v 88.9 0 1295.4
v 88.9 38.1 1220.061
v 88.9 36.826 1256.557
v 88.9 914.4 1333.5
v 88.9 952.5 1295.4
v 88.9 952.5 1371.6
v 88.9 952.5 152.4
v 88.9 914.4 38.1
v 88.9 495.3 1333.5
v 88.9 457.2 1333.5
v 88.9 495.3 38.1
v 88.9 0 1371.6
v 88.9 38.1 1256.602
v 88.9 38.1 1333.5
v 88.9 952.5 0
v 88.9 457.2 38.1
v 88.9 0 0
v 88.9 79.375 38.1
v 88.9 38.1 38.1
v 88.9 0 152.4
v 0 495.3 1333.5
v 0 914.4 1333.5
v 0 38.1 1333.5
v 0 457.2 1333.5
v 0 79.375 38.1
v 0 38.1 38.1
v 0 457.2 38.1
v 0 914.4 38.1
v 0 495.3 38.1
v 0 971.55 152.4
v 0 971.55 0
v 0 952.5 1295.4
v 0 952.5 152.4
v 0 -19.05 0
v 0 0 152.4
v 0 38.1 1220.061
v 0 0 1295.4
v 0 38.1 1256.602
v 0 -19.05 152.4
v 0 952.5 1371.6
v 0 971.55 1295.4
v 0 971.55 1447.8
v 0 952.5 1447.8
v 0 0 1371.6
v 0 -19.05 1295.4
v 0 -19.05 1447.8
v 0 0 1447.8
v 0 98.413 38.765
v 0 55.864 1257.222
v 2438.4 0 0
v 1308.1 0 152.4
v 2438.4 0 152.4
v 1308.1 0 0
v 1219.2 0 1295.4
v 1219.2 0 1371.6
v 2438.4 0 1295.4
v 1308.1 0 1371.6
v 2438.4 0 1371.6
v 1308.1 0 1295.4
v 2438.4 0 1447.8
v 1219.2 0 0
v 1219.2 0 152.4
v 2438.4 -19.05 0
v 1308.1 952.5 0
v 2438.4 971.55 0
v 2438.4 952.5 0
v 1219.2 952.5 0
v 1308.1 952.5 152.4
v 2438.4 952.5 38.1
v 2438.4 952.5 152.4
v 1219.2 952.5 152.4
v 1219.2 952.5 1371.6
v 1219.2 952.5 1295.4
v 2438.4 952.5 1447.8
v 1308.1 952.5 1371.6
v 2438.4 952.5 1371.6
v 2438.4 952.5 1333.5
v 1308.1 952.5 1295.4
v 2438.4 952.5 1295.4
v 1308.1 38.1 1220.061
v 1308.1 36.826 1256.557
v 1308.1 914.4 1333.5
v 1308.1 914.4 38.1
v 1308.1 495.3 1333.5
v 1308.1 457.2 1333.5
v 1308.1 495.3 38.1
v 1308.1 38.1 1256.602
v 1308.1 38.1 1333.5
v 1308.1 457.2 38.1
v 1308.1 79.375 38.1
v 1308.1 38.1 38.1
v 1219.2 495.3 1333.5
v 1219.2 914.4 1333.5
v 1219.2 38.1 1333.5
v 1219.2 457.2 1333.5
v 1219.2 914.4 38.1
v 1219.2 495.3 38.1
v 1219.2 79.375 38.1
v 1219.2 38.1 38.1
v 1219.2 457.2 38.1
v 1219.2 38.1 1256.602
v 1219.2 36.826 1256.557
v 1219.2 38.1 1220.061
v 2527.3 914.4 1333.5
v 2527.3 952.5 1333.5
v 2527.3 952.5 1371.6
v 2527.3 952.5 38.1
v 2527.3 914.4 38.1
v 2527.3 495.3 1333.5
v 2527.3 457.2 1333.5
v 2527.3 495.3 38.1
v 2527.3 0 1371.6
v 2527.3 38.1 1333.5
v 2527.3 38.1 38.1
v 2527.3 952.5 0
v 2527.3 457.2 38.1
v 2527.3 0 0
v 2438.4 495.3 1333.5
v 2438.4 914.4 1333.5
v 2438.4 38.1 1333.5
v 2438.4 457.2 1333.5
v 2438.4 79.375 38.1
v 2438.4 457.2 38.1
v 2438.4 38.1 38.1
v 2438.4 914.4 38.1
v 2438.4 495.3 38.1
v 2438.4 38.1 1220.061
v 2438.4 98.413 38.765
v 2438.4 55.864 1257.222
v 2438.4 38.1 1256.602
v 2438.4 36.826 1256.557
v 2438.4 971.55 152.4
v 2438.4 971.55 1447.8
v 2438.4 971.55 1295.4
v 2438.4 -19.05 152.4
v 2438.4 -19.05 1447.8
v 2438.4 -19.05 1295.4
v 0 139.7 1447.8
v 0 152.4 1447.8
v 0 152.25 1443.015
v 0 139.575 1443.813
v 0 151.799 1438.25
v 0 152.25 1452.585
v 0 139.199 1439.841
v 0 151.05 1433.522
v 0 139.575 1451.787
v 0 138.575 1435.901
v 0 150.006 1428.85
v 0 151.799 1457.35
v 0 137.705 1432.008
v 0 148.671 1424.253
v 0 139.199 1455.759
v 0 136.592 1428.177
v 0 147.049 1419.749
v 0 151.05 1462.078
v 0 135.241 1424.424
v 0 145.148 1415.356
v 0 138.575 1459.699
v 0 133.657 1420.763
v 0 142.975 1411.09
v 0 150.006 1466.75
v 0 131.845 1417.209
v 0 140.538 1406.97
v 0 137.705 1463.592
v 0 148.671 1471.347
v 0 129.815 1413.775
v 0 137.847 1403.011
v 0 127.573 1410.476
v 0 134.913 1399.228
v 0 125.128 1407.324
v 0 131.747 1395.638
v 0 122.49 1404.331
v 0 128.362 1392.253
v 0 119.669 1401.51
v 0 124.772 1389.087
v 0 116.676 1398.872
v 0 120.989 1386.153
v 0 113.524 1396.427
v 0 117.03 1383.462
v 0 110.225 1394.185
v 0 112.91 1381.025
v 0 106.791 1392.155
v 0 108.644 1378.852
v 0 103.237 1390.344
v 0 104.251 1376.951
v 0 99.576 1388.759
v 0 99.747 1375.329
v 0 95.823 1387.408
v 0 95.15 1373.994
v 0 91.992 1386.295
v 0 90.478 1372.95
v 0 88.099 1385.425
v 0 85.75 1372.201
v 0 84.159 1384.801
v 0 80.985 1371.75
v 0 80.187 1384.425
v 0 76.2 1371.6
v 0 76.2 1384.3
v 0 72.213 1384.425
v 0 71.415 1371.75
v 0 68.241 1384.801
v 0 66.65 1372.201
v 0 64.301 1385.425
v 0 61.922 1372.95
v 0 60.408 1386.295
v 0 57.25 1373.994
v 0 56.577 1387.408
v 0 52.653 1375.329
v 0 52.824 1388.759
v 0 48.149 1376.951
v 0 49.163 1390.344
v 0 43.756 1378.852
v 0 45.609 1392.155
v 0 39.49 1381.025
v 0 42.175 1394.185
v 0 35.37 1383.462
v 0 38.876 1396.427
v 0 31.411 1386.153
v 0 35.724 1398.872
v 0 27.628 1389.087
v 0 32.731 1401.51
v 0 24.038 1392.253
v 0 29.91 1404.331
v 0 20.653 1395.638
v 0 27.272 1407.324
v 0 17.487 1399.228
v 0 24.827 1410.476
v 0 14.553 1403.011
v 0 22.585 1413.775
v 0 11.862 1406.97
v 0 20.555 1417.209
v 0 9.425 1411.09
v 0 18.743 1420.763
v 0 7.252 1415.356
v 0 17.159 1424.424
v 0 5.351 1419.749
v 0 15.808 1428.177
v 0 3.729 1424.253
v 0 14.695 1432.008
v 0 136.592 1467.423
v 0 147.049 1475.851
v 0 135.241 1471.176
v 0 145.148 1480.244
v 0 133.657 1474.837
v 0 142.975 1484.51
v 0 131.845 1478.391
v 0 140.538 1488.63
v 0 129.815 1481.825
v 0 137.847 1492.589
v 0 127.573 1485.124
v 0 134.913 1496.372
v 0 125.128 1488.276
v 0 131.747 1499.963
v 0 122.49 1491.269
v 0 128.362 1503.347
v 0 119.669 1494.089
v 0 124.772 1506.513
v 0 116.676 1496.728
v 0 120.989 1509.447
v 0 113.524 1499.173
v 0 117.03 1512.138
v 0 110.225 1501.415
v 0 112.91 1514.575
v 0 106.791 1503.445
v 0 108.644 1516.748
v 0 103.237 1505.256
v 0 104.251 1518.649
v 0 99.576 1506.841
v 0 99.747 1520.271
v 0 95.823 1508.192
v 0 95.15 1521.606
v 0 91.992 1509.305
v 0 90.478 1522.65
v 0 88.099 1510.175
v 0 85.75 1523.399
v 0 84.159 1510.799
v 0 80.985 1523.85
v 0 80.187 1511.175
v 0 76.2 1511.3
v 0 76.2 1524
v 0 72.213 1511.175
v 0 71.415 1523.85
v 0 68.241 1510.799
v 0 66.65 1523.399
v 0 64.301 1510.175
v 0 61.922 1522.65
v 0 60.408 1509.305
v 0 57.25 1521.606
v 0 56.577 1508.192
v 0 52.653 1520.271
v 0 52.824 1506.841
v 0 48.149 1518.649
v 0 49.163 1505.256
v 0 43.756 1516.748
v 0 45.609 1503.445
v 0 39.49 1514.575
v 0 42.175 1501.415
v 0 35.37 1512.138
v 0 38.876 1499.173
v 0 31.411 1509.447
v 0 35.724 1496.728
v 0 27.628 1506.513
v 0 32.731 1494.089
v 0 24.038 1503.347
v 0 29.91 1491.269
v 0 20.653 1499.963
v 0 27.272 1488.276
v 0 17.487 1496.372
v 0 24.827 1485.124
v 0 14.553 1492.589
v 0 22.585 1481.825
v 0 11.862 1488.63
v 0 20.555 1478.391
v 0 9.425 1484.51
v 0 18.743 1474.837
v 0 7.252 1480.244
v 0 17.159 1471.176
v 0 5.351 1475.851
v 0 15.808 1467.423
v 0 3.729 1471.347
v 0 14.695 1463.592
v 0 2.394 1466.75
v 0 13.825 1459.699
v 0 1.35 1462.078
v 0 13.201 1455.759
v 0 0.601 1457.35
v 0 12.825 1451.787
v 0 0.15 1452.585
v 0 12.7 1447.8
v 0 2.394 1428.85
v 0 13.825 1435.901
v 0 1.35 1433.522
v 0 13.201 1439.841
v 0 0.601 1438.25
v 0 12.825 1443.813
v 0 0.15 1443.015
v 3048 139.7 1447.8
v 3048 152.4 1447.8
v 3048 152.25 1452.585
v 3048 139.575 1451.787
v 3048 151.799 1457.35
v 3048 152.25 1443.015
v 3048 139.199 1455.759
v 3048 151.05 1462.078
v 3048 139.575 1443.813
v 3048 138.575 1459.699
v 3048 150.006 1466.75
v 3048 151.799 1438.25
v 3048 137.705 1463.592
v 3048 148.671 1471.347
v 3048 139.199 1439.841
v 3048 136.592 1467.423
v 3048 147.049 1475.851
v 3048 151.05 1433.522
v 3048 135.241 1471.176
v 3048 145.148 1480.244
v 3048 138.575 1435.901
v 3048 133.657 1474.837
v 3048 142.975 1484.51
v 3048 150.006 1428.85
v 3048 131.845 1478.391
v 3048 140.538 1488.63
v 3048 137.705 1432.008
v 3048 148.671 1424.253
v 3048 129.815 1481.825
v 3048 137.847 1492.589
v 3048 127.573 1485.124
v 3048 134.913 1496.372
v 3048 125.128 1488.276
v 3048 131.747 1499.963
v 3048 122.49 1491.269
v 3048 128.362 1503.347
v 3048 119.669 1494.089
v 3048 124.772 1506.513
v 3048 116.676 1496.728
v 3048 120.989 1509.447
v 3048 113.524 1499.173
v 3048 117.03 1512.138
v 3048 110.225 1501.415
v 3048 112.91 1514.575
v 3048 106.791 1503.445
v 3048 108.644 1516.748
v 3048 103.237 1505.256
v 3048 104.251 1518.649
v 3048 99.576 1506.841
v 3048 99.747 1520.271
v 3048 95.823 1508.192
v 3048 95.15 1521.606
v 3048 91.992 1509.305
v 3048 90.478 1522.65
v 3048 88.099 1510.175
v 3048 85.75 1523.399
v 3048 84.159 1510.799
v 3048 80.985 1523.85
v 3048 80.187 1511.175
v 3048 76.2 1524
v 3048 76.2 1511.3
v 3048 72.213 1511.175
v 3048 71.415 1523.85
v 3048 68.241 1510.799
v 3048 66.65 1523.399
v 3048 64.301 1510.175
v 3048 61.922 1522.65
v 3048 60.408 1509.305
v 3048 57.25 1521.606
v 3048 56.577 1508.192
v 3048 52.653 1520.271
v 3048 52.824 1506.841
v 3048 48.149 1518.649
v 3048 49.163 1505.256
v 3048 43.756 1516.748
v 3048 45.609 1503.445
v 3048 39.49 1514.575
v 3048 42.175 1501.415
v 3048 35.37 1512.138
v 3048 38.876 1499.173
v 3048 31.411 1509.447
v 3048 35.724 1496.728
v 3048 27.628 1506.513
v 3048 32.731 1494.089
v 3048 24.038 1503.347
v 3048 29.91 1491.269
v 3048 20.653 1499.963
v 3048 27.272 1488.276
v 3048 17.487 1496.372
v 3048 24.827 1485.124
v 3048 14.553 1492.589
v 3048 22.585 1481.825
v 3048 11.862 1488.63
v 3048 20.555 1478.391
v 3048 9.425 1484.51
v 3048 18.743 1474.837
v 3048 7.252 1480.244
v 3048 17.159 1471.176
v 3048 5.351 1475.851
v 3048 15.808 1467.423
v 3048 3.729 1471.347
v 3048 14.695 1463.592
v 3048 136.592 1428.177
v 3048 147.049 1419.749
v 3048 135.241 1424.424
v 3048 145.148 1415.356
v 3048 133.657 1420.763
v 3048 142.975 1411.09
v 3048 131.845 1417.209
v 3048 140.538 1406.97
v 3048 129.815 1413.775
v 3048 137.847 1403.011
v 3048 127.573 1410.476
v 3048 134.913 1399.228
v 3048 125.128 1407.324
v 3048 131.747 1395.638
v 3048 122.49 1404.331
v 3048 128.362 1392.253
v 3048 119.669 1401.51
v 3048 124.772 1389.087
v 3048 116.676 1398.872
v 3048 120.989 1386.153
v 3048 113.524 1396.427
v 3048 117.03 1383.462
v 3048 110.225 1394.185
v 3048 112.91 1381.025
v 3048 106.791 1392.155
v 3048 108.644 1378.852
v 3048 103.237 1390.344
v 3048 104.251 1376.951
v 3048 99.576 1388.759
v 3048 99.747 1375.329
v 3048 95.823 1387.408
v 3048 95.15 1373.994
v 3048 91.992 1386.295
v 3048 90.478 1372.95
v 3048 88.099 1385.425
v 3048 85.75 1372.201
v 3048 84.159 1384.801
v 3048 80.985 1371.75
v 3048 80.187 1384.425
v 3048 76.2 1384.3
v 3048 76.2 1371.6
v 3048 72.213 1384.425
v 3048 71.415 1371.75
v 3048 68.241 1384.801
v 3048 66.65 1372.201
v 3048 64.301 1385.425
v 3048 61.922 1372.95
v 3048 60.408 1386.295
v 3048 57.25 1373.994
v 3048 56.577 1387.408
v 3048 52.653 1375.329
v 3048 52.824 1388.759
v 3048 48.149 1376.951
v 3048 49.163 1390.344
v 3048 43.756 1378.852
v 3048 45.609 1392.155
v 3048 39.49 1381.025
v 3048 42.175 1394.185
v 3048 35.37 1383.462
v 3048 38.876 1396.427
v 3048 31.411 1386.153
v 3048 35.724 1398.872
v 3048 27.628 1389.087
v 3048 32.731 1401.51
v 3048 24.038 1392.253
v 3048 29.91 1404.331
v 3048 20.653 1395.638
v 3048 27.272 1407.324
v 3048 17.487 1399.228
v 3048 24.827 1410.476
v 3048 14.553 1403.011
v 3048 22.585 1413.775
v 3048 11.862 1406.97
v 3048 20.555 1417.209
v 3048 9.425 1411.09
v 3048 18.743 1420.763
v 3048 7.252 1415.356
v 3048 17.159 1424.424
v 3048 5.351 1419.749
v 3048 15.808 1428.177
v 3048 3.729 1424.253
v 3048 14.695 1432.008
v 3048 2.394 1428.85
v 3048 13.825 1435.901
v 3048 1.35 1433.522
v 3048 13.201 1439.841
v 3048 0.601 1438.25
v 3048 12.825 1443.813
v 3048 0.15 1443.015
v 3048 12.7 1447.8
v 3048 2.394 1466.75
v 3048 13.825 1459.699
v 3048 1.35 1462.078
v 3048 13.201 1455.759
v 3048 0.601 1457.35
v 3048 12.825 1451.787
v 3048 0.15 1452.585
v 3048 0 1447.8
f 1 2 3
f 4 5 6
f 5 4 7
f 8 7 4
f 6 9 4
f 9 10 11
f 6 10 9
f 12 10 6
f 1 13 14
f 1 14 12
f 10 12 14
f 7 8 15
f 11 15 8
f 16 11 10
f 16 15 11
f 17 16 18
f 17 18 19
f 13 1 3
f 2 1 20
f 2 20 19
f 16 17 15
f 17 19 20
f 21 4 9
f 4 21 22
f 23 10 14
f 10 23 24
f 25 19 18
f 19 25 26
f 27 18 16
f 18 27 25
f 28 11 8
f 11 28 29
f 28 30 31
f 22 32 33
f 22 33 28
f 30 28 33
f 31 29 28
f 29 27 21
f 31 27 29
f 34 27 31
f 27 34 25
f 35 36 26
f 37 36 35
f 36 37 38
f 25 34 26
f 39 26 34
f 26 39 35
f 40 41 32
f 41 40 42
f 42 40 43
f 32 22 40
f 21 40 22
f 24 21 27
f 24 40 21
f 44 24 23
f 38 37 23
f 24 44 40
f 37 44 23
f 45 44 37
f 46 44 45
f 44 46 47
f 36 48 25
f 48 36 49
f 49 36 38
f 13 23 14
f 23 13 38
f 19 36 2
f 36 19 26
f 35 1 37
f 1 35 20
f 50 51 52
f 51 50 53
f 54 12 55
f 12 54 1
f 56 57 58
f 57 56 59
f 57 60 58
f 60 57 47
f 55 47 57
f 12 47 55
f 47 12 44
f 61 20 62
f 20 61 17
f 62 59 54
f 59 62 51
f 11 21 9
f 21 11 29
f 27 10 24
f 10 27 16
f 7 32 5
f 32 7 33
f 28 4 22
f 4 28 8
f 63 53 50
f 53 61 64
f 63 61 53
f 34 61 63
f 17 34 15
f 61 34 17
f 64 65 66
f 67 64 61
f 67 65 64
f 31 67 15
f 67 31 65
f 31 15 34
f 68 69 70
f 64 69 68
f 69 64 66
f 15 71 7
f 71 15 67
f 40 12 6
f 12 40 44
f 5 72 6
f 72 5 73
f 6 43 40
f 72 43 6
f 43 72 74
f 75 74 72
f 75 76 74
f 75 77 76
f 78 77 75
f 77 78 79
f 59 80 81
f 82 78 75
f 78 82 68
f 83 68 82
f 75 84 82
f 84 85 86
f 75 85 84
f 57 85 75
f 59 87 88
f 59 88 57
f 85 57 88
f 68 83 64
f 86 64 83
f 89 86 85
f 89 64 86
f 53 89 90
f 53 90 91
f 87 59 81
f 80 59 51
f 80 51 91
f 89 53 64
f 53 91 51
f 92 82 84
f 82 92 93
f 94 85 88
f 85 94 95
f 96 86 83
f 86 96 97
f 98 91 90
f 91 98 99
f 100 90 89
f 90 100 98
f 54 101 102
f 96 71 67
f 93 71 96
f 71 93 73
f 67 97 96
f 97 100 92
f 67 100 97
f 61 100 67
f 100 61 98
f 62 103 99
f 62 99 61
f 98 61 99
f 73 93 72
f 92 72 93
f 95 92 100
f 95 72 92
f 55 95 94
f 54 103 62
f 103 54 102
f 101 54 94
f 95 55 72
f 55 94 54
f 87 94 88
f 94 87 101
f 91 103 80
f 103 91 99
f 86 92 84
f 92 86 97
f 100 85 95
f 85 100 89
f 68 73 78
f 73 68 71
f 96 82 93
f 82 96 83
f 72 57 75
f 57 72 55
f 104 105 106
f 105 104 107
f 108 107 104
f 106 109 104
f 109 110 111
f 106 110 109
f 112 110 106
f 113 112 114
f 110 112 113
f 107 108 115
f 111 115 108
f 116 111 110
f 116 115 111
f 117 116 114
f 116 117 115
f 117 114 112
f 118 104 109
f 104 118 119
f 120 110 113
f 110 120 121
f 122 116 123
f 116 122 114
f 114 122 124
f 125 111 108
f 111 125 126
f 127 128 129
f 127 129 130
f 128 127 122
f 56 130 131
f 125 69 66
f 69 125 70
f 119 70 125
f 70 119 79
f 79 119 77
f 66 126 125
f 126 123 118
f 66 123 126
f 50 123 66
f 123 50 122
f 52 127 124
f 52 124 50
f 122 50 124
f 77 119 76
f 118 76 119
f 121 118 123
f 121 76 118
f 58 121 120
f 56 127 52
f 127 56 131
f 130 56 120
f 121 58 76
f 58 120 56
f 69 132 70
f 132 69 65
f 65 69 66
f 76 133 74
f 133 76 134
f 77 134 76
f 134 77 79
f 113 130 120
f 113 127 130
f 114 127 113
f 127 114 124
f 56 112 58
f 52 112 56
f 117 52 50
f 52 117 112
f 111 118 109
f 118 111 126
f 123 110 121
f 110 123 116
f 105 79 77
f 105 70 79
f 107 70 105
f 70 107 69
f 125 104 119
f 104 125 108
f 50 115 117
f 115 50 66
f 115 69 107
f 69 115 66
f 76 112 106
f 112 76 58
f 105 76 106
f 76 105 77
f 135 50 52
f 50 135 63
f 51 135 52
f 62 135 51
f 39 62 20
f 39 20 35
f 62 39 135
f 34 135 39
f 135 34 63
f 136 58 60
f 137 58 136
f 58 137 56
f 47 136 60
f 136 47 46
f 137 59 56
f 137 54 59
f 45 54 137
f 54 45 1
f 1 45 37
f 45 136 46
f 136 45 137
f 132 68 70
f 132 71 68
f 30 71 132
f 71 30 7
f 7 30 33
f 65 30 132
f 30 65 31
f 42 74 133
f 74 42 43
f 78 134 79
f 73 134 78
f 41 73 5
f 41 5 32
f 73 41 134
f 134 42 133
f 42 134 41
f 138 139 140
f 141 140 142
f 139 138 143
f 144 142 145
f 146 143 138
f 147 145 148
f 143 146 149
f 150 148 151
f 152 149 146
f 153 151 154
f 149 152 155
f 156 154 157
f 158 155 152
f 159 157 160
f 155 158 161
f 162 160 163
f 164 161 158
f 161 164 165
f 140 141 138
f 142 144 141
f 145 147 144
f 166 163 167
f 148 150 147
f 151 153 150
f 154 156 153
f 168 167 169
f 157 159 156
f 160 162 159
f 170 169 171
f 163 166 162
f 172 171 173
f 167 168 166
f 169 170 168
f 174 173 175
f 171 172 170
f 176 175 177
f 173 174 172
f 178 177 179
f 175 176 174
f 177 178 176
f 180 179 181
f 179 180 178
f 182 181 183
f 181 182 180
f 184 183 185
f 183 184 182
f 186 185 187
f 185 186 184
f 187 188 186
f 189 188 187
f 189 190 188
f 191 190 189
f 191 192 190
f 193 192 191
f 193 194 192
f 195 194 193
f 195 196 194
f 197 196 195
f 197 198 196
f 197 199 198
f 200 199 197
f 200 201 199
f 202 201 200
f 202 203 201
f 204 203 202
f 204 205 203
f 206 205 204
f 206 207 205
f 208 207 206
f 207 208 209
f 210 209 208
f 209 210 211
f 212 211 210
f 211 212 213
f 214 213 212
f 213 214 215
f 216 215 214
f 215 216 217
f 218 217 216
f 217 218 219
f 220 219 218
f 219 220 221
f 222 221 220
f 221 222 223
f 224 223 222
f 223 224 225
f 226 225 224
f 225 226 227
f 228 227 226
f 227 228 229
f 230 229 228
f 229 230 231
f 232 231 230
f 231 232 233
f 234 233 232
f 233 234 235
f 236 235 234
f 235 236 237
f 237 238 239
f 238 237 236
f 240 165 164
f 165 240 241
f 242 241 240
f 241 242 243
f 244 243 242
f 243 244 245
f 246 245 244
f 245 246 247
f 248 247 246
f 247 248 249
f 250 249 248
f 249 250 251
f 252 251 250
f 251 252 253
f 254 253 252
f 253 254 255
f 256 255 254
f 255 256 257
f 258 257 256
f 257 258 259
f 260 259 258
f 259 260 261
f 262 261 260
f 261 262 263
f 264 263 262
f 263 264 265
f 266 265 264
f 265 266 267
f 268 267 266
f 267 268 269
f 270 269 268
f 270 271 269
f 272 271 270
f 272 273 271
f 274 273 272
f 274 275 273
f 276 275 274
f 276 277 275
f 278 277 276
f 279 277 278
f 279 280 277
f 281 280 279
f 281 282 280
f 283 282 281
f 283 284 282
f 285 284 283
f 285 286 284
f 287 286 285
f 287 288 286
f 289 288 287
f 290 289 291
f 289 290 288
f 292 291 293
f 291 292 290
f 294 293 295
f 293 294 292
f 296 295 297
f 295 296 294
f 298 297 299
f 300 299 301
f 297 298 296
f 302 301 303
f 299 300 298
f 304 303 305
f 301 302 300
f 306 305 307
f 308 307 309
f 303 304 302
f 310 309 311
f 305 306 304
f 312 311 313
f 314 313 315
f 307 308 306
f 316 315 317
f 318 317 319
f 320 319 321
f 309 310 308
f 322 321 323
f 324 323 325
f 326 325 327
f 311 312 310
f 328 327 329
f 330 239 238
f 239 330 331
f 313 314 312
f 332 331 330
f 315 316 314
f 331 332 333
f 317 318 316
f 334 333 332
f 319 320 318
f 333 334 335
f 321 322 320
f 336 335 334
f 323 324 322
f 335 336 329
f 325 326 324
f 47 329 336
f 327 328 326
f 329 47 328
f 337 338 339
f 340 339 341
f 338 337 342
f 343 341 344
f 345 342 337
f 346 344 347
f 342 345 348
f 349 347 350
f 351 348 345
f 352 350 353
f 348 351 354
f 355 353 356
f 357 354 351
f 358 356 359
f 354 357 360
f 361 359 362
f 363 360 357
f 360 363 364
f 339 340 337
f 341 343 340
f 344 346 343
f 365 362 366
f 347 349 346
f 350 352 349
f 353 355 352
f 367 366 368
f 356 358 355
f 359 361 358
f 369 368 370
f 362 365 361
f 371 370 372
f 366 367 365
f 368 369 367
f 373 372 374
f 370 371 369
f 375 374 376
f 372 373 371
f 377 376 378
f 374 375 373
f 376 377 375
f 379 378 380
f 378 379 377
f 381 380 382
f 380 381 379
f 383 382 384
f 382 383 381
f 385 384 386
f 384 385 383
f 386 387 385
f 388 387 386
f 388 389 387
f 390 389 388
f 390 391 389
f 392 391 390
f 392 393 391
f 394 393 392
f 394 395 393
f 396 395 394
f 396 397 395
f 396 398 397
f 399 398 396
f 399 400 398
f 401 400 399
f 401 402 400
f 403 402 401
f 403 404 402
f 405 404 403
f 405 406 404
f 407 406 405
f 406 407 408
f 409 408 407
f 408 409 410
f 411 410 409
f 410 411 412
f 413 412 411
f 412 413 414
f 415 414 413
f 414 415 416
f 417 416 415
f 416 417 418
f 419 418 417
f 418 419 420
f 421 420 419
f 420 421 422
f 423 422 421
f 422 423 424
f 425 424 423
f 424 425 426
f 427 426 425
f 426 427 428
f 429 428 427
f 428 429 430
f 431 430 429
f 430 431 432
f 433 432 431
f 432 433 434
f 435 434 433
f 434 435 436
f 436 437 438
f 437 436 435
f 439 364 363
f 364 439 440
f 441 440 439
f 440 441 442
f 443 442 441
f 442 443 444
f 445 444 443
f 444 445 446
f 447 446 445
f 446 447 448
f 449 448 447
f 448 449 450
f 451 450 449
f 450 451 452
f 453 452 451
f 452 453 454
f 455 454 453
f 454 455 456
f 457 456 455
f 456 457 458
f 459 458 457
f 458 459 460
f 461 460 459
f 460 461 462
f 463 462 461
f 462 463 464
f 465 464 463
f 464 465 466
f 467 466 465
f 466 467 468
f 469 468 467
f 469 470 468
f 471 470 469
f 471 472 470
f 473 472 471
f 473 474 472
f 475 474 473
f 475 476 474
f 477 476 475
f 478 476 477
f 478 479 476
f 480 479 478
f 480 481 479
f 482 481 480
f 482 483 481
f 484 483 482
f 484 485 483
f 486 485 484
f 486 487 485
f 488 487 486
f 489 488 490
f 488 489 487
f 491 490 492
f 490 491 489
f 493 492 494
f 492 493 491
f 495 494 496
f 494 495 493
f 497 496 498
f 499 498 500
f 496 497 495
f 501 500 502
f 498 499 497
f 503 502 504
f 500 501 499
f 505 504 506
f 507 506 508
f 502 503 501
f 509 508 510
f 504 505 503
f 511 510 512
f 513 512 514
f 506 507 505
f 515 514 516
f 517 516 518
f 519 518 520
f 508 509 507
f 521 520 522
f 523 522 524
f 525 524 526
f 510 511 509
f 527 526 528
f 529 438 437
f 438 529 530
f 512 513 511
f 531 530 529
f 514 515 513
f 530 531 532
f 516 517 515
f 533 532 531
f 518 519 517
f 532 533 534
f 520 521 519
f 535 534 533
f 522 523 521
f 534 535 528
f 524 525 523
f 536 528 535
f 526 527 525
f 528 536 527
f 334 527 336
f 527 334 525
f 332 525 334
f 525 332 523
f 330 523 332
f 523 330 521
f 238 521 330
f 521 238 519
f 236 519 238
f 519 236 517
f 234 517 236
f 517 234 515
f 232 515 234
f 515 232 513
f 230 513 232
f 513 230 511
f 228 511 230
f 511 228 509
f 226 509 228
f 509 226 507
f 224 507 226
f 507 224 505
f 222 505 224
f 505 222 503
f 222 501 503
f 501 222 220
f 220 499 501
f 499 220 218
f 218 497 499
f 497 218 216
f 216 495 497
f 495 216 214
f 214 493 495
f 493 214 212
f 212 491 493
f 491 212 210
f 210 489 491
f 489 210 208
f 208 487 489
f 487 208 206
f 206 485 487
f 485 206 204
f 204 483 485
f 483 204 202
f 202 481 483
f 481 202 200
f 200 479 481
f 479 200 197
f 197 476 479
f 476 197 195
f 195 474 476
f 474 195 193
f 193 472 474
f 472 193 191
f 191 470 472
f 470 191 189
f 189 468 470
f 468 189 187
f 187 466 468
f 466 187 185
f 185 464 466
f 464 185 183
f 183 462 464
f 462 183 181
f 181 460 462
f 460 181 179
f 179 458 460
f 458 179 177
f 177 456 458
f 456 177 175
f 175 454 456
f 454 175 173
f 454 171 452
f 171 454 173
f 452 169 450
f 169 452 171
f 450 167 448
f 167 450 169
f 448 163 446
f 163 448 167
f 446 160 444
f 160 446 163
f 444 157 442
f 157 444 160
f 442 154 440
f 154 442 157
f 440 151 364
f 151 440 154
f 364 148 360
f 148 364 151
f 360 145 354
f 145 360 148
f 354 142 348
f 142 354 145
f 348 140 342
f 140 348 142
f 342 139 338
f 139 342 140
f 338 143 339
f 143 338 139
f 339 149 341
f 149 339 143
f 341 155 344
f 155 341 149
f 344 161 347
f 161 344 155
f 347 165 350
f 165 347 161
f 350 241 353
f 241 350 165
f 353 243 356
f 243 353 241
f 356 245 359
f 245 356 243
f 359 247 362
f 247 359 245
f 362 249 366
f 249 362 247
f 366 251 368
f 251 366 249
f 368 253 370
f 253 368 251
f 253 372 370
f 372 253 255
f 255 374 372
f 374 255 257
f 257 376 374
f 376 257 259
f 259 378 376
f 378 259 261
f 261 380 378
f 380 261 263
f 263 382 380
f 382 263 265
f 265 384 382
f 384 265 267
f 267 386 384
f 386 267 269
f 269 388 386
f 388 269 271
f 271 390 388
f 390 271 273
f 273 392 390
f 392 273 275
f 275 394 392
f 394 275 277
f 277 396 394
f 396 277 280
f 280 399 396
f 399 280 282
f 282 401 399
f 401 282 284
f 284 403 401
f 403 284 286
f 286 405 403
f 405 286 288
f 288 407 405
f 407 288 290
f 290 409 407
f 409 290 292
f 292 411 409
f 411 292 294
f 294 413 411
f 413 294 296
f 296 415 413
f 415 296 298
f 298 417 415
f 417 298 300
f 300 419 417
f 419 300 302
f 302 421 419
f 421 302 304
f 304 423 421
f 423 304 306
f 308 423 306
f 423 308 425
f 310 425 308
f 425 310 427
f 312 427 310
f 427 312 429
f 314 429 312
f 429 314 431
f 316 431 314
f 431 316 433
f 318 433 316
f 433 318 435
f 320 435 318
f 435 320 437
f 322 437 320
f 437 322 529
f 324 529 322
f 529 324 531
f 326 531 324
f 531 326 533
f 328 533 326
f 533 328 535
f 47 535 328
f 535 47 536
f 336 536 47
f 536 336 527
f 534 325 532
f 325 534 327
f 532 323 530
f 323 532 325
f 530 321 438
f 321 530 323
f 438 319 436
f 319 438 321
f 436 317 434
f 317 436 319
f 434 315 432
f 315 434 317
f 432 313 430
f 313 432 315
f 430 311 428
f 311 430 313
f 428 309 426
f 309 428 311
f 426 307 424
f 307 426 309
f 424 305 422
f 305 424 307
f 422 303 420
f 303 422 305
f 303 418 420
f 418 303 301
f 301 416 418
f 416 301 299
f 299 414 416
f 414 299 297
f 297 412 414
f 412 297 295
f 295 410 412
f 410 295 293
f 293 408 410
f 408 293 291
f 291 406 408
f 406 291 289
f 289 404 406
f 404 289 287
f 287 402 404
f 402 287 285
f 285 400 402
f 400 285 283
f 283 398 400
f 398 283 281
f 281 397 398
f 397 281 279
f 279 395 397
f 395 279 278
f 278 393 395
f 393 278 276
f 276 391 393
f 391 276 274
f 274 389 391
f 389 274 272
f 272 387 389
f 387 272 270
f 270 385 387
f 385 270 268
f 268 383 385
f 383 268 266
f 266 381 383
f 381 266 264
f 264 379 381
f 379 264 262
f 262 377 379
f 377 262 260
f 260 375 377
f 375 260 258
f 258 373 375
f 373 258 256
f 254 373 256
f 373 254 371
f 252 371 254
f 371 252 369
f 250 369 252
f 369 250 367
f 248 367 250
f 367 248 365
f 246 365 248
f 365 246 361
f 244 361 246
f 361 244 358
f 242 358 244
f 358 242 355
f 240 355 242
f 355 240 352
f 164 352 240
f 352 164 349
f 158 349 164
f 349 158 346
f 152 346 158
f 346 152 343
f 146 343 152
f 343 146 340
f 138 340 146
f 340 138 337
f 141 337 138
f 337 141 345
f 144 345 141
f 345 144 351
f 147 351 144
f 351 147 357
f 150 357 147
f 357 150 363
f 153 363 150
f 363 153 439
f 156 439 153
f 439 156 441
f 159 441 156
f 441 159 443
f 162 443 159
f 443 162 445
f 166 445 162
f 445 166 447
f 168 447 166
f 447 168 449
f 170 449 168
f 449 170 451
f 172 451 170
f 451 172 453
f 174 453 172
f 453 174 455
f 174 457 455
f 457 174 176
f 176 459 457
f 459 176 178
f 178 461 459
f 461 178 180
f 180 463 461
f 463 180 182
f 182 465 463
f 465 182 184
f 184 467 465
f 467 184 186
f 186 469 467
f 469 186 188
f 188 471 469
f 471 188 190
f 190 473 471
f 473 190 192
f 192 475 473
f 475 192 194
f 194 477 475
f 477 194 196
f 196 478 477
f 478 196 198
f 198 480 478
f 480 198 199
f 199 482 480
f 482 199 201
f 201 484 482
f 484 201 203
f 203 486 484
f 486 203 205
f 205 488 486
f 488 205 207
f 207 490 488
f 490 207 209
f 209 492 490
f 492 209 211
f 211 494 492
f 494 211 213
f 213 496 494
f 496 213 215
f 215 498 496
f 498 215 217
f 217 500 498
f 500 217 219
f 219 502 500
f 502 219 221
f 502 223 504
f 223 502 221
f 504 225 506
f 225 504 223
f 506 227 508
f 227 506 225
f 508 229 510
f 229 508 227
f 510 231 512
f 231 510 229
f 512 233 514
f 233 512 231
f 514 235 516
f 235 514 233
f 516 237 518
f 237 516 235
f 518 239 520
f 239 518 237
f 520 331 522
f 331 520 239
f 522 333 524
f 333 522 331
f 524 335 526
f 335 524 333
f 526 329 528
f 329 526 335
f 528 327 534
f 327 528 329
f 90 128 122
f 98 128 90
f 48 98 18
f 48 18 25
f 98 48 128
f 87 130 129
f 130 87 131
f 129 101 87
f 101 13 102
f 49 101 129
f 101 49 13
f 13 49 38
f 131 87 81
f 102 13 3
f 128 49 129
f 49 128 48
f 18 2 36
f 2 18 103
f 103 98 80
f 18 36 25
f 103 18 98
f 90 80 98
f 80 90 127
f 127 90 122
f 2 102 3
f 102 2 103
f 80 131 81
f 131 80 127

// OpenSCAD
dx=feet(8);
dz=feet(4.25);
for(x=[0:dx/2:dx])
{
  for(y=[0:2])
    translate([x,inches(y*18),inches(1.5)])
      cube([inches(3.5),inches(1.5),dz]);
  for(z=[0,dz+inches(1.5)])
    translate([x,0,z]) color("blue")
      cube([inches(3.5),feet(3)+inches(1.5),inches(1.5)]);
}
for(y=[-1*inches(.75),feet(3)+inches(1.5)],z=[0,dz])
  translate([0,y,z]) color("brown") cube([feet(8),inches(.75),inches(6)]);
translate([0,inches(3),dz+inches(6)]) rotate([0,90,0]) linear_extrude(feet(10)) difference() { circle(d=inches(6),$fn=100); circle(d=inches(5), $fn=100); }

translate([0,inches(3.125),inches(1.5)]) rotate([2,0]) color("green") cube([feet(8),inches(.75),feet(4)]);

function inches(mm) = mm * 25.4;
function feet(in) = 12 * inches(in);
